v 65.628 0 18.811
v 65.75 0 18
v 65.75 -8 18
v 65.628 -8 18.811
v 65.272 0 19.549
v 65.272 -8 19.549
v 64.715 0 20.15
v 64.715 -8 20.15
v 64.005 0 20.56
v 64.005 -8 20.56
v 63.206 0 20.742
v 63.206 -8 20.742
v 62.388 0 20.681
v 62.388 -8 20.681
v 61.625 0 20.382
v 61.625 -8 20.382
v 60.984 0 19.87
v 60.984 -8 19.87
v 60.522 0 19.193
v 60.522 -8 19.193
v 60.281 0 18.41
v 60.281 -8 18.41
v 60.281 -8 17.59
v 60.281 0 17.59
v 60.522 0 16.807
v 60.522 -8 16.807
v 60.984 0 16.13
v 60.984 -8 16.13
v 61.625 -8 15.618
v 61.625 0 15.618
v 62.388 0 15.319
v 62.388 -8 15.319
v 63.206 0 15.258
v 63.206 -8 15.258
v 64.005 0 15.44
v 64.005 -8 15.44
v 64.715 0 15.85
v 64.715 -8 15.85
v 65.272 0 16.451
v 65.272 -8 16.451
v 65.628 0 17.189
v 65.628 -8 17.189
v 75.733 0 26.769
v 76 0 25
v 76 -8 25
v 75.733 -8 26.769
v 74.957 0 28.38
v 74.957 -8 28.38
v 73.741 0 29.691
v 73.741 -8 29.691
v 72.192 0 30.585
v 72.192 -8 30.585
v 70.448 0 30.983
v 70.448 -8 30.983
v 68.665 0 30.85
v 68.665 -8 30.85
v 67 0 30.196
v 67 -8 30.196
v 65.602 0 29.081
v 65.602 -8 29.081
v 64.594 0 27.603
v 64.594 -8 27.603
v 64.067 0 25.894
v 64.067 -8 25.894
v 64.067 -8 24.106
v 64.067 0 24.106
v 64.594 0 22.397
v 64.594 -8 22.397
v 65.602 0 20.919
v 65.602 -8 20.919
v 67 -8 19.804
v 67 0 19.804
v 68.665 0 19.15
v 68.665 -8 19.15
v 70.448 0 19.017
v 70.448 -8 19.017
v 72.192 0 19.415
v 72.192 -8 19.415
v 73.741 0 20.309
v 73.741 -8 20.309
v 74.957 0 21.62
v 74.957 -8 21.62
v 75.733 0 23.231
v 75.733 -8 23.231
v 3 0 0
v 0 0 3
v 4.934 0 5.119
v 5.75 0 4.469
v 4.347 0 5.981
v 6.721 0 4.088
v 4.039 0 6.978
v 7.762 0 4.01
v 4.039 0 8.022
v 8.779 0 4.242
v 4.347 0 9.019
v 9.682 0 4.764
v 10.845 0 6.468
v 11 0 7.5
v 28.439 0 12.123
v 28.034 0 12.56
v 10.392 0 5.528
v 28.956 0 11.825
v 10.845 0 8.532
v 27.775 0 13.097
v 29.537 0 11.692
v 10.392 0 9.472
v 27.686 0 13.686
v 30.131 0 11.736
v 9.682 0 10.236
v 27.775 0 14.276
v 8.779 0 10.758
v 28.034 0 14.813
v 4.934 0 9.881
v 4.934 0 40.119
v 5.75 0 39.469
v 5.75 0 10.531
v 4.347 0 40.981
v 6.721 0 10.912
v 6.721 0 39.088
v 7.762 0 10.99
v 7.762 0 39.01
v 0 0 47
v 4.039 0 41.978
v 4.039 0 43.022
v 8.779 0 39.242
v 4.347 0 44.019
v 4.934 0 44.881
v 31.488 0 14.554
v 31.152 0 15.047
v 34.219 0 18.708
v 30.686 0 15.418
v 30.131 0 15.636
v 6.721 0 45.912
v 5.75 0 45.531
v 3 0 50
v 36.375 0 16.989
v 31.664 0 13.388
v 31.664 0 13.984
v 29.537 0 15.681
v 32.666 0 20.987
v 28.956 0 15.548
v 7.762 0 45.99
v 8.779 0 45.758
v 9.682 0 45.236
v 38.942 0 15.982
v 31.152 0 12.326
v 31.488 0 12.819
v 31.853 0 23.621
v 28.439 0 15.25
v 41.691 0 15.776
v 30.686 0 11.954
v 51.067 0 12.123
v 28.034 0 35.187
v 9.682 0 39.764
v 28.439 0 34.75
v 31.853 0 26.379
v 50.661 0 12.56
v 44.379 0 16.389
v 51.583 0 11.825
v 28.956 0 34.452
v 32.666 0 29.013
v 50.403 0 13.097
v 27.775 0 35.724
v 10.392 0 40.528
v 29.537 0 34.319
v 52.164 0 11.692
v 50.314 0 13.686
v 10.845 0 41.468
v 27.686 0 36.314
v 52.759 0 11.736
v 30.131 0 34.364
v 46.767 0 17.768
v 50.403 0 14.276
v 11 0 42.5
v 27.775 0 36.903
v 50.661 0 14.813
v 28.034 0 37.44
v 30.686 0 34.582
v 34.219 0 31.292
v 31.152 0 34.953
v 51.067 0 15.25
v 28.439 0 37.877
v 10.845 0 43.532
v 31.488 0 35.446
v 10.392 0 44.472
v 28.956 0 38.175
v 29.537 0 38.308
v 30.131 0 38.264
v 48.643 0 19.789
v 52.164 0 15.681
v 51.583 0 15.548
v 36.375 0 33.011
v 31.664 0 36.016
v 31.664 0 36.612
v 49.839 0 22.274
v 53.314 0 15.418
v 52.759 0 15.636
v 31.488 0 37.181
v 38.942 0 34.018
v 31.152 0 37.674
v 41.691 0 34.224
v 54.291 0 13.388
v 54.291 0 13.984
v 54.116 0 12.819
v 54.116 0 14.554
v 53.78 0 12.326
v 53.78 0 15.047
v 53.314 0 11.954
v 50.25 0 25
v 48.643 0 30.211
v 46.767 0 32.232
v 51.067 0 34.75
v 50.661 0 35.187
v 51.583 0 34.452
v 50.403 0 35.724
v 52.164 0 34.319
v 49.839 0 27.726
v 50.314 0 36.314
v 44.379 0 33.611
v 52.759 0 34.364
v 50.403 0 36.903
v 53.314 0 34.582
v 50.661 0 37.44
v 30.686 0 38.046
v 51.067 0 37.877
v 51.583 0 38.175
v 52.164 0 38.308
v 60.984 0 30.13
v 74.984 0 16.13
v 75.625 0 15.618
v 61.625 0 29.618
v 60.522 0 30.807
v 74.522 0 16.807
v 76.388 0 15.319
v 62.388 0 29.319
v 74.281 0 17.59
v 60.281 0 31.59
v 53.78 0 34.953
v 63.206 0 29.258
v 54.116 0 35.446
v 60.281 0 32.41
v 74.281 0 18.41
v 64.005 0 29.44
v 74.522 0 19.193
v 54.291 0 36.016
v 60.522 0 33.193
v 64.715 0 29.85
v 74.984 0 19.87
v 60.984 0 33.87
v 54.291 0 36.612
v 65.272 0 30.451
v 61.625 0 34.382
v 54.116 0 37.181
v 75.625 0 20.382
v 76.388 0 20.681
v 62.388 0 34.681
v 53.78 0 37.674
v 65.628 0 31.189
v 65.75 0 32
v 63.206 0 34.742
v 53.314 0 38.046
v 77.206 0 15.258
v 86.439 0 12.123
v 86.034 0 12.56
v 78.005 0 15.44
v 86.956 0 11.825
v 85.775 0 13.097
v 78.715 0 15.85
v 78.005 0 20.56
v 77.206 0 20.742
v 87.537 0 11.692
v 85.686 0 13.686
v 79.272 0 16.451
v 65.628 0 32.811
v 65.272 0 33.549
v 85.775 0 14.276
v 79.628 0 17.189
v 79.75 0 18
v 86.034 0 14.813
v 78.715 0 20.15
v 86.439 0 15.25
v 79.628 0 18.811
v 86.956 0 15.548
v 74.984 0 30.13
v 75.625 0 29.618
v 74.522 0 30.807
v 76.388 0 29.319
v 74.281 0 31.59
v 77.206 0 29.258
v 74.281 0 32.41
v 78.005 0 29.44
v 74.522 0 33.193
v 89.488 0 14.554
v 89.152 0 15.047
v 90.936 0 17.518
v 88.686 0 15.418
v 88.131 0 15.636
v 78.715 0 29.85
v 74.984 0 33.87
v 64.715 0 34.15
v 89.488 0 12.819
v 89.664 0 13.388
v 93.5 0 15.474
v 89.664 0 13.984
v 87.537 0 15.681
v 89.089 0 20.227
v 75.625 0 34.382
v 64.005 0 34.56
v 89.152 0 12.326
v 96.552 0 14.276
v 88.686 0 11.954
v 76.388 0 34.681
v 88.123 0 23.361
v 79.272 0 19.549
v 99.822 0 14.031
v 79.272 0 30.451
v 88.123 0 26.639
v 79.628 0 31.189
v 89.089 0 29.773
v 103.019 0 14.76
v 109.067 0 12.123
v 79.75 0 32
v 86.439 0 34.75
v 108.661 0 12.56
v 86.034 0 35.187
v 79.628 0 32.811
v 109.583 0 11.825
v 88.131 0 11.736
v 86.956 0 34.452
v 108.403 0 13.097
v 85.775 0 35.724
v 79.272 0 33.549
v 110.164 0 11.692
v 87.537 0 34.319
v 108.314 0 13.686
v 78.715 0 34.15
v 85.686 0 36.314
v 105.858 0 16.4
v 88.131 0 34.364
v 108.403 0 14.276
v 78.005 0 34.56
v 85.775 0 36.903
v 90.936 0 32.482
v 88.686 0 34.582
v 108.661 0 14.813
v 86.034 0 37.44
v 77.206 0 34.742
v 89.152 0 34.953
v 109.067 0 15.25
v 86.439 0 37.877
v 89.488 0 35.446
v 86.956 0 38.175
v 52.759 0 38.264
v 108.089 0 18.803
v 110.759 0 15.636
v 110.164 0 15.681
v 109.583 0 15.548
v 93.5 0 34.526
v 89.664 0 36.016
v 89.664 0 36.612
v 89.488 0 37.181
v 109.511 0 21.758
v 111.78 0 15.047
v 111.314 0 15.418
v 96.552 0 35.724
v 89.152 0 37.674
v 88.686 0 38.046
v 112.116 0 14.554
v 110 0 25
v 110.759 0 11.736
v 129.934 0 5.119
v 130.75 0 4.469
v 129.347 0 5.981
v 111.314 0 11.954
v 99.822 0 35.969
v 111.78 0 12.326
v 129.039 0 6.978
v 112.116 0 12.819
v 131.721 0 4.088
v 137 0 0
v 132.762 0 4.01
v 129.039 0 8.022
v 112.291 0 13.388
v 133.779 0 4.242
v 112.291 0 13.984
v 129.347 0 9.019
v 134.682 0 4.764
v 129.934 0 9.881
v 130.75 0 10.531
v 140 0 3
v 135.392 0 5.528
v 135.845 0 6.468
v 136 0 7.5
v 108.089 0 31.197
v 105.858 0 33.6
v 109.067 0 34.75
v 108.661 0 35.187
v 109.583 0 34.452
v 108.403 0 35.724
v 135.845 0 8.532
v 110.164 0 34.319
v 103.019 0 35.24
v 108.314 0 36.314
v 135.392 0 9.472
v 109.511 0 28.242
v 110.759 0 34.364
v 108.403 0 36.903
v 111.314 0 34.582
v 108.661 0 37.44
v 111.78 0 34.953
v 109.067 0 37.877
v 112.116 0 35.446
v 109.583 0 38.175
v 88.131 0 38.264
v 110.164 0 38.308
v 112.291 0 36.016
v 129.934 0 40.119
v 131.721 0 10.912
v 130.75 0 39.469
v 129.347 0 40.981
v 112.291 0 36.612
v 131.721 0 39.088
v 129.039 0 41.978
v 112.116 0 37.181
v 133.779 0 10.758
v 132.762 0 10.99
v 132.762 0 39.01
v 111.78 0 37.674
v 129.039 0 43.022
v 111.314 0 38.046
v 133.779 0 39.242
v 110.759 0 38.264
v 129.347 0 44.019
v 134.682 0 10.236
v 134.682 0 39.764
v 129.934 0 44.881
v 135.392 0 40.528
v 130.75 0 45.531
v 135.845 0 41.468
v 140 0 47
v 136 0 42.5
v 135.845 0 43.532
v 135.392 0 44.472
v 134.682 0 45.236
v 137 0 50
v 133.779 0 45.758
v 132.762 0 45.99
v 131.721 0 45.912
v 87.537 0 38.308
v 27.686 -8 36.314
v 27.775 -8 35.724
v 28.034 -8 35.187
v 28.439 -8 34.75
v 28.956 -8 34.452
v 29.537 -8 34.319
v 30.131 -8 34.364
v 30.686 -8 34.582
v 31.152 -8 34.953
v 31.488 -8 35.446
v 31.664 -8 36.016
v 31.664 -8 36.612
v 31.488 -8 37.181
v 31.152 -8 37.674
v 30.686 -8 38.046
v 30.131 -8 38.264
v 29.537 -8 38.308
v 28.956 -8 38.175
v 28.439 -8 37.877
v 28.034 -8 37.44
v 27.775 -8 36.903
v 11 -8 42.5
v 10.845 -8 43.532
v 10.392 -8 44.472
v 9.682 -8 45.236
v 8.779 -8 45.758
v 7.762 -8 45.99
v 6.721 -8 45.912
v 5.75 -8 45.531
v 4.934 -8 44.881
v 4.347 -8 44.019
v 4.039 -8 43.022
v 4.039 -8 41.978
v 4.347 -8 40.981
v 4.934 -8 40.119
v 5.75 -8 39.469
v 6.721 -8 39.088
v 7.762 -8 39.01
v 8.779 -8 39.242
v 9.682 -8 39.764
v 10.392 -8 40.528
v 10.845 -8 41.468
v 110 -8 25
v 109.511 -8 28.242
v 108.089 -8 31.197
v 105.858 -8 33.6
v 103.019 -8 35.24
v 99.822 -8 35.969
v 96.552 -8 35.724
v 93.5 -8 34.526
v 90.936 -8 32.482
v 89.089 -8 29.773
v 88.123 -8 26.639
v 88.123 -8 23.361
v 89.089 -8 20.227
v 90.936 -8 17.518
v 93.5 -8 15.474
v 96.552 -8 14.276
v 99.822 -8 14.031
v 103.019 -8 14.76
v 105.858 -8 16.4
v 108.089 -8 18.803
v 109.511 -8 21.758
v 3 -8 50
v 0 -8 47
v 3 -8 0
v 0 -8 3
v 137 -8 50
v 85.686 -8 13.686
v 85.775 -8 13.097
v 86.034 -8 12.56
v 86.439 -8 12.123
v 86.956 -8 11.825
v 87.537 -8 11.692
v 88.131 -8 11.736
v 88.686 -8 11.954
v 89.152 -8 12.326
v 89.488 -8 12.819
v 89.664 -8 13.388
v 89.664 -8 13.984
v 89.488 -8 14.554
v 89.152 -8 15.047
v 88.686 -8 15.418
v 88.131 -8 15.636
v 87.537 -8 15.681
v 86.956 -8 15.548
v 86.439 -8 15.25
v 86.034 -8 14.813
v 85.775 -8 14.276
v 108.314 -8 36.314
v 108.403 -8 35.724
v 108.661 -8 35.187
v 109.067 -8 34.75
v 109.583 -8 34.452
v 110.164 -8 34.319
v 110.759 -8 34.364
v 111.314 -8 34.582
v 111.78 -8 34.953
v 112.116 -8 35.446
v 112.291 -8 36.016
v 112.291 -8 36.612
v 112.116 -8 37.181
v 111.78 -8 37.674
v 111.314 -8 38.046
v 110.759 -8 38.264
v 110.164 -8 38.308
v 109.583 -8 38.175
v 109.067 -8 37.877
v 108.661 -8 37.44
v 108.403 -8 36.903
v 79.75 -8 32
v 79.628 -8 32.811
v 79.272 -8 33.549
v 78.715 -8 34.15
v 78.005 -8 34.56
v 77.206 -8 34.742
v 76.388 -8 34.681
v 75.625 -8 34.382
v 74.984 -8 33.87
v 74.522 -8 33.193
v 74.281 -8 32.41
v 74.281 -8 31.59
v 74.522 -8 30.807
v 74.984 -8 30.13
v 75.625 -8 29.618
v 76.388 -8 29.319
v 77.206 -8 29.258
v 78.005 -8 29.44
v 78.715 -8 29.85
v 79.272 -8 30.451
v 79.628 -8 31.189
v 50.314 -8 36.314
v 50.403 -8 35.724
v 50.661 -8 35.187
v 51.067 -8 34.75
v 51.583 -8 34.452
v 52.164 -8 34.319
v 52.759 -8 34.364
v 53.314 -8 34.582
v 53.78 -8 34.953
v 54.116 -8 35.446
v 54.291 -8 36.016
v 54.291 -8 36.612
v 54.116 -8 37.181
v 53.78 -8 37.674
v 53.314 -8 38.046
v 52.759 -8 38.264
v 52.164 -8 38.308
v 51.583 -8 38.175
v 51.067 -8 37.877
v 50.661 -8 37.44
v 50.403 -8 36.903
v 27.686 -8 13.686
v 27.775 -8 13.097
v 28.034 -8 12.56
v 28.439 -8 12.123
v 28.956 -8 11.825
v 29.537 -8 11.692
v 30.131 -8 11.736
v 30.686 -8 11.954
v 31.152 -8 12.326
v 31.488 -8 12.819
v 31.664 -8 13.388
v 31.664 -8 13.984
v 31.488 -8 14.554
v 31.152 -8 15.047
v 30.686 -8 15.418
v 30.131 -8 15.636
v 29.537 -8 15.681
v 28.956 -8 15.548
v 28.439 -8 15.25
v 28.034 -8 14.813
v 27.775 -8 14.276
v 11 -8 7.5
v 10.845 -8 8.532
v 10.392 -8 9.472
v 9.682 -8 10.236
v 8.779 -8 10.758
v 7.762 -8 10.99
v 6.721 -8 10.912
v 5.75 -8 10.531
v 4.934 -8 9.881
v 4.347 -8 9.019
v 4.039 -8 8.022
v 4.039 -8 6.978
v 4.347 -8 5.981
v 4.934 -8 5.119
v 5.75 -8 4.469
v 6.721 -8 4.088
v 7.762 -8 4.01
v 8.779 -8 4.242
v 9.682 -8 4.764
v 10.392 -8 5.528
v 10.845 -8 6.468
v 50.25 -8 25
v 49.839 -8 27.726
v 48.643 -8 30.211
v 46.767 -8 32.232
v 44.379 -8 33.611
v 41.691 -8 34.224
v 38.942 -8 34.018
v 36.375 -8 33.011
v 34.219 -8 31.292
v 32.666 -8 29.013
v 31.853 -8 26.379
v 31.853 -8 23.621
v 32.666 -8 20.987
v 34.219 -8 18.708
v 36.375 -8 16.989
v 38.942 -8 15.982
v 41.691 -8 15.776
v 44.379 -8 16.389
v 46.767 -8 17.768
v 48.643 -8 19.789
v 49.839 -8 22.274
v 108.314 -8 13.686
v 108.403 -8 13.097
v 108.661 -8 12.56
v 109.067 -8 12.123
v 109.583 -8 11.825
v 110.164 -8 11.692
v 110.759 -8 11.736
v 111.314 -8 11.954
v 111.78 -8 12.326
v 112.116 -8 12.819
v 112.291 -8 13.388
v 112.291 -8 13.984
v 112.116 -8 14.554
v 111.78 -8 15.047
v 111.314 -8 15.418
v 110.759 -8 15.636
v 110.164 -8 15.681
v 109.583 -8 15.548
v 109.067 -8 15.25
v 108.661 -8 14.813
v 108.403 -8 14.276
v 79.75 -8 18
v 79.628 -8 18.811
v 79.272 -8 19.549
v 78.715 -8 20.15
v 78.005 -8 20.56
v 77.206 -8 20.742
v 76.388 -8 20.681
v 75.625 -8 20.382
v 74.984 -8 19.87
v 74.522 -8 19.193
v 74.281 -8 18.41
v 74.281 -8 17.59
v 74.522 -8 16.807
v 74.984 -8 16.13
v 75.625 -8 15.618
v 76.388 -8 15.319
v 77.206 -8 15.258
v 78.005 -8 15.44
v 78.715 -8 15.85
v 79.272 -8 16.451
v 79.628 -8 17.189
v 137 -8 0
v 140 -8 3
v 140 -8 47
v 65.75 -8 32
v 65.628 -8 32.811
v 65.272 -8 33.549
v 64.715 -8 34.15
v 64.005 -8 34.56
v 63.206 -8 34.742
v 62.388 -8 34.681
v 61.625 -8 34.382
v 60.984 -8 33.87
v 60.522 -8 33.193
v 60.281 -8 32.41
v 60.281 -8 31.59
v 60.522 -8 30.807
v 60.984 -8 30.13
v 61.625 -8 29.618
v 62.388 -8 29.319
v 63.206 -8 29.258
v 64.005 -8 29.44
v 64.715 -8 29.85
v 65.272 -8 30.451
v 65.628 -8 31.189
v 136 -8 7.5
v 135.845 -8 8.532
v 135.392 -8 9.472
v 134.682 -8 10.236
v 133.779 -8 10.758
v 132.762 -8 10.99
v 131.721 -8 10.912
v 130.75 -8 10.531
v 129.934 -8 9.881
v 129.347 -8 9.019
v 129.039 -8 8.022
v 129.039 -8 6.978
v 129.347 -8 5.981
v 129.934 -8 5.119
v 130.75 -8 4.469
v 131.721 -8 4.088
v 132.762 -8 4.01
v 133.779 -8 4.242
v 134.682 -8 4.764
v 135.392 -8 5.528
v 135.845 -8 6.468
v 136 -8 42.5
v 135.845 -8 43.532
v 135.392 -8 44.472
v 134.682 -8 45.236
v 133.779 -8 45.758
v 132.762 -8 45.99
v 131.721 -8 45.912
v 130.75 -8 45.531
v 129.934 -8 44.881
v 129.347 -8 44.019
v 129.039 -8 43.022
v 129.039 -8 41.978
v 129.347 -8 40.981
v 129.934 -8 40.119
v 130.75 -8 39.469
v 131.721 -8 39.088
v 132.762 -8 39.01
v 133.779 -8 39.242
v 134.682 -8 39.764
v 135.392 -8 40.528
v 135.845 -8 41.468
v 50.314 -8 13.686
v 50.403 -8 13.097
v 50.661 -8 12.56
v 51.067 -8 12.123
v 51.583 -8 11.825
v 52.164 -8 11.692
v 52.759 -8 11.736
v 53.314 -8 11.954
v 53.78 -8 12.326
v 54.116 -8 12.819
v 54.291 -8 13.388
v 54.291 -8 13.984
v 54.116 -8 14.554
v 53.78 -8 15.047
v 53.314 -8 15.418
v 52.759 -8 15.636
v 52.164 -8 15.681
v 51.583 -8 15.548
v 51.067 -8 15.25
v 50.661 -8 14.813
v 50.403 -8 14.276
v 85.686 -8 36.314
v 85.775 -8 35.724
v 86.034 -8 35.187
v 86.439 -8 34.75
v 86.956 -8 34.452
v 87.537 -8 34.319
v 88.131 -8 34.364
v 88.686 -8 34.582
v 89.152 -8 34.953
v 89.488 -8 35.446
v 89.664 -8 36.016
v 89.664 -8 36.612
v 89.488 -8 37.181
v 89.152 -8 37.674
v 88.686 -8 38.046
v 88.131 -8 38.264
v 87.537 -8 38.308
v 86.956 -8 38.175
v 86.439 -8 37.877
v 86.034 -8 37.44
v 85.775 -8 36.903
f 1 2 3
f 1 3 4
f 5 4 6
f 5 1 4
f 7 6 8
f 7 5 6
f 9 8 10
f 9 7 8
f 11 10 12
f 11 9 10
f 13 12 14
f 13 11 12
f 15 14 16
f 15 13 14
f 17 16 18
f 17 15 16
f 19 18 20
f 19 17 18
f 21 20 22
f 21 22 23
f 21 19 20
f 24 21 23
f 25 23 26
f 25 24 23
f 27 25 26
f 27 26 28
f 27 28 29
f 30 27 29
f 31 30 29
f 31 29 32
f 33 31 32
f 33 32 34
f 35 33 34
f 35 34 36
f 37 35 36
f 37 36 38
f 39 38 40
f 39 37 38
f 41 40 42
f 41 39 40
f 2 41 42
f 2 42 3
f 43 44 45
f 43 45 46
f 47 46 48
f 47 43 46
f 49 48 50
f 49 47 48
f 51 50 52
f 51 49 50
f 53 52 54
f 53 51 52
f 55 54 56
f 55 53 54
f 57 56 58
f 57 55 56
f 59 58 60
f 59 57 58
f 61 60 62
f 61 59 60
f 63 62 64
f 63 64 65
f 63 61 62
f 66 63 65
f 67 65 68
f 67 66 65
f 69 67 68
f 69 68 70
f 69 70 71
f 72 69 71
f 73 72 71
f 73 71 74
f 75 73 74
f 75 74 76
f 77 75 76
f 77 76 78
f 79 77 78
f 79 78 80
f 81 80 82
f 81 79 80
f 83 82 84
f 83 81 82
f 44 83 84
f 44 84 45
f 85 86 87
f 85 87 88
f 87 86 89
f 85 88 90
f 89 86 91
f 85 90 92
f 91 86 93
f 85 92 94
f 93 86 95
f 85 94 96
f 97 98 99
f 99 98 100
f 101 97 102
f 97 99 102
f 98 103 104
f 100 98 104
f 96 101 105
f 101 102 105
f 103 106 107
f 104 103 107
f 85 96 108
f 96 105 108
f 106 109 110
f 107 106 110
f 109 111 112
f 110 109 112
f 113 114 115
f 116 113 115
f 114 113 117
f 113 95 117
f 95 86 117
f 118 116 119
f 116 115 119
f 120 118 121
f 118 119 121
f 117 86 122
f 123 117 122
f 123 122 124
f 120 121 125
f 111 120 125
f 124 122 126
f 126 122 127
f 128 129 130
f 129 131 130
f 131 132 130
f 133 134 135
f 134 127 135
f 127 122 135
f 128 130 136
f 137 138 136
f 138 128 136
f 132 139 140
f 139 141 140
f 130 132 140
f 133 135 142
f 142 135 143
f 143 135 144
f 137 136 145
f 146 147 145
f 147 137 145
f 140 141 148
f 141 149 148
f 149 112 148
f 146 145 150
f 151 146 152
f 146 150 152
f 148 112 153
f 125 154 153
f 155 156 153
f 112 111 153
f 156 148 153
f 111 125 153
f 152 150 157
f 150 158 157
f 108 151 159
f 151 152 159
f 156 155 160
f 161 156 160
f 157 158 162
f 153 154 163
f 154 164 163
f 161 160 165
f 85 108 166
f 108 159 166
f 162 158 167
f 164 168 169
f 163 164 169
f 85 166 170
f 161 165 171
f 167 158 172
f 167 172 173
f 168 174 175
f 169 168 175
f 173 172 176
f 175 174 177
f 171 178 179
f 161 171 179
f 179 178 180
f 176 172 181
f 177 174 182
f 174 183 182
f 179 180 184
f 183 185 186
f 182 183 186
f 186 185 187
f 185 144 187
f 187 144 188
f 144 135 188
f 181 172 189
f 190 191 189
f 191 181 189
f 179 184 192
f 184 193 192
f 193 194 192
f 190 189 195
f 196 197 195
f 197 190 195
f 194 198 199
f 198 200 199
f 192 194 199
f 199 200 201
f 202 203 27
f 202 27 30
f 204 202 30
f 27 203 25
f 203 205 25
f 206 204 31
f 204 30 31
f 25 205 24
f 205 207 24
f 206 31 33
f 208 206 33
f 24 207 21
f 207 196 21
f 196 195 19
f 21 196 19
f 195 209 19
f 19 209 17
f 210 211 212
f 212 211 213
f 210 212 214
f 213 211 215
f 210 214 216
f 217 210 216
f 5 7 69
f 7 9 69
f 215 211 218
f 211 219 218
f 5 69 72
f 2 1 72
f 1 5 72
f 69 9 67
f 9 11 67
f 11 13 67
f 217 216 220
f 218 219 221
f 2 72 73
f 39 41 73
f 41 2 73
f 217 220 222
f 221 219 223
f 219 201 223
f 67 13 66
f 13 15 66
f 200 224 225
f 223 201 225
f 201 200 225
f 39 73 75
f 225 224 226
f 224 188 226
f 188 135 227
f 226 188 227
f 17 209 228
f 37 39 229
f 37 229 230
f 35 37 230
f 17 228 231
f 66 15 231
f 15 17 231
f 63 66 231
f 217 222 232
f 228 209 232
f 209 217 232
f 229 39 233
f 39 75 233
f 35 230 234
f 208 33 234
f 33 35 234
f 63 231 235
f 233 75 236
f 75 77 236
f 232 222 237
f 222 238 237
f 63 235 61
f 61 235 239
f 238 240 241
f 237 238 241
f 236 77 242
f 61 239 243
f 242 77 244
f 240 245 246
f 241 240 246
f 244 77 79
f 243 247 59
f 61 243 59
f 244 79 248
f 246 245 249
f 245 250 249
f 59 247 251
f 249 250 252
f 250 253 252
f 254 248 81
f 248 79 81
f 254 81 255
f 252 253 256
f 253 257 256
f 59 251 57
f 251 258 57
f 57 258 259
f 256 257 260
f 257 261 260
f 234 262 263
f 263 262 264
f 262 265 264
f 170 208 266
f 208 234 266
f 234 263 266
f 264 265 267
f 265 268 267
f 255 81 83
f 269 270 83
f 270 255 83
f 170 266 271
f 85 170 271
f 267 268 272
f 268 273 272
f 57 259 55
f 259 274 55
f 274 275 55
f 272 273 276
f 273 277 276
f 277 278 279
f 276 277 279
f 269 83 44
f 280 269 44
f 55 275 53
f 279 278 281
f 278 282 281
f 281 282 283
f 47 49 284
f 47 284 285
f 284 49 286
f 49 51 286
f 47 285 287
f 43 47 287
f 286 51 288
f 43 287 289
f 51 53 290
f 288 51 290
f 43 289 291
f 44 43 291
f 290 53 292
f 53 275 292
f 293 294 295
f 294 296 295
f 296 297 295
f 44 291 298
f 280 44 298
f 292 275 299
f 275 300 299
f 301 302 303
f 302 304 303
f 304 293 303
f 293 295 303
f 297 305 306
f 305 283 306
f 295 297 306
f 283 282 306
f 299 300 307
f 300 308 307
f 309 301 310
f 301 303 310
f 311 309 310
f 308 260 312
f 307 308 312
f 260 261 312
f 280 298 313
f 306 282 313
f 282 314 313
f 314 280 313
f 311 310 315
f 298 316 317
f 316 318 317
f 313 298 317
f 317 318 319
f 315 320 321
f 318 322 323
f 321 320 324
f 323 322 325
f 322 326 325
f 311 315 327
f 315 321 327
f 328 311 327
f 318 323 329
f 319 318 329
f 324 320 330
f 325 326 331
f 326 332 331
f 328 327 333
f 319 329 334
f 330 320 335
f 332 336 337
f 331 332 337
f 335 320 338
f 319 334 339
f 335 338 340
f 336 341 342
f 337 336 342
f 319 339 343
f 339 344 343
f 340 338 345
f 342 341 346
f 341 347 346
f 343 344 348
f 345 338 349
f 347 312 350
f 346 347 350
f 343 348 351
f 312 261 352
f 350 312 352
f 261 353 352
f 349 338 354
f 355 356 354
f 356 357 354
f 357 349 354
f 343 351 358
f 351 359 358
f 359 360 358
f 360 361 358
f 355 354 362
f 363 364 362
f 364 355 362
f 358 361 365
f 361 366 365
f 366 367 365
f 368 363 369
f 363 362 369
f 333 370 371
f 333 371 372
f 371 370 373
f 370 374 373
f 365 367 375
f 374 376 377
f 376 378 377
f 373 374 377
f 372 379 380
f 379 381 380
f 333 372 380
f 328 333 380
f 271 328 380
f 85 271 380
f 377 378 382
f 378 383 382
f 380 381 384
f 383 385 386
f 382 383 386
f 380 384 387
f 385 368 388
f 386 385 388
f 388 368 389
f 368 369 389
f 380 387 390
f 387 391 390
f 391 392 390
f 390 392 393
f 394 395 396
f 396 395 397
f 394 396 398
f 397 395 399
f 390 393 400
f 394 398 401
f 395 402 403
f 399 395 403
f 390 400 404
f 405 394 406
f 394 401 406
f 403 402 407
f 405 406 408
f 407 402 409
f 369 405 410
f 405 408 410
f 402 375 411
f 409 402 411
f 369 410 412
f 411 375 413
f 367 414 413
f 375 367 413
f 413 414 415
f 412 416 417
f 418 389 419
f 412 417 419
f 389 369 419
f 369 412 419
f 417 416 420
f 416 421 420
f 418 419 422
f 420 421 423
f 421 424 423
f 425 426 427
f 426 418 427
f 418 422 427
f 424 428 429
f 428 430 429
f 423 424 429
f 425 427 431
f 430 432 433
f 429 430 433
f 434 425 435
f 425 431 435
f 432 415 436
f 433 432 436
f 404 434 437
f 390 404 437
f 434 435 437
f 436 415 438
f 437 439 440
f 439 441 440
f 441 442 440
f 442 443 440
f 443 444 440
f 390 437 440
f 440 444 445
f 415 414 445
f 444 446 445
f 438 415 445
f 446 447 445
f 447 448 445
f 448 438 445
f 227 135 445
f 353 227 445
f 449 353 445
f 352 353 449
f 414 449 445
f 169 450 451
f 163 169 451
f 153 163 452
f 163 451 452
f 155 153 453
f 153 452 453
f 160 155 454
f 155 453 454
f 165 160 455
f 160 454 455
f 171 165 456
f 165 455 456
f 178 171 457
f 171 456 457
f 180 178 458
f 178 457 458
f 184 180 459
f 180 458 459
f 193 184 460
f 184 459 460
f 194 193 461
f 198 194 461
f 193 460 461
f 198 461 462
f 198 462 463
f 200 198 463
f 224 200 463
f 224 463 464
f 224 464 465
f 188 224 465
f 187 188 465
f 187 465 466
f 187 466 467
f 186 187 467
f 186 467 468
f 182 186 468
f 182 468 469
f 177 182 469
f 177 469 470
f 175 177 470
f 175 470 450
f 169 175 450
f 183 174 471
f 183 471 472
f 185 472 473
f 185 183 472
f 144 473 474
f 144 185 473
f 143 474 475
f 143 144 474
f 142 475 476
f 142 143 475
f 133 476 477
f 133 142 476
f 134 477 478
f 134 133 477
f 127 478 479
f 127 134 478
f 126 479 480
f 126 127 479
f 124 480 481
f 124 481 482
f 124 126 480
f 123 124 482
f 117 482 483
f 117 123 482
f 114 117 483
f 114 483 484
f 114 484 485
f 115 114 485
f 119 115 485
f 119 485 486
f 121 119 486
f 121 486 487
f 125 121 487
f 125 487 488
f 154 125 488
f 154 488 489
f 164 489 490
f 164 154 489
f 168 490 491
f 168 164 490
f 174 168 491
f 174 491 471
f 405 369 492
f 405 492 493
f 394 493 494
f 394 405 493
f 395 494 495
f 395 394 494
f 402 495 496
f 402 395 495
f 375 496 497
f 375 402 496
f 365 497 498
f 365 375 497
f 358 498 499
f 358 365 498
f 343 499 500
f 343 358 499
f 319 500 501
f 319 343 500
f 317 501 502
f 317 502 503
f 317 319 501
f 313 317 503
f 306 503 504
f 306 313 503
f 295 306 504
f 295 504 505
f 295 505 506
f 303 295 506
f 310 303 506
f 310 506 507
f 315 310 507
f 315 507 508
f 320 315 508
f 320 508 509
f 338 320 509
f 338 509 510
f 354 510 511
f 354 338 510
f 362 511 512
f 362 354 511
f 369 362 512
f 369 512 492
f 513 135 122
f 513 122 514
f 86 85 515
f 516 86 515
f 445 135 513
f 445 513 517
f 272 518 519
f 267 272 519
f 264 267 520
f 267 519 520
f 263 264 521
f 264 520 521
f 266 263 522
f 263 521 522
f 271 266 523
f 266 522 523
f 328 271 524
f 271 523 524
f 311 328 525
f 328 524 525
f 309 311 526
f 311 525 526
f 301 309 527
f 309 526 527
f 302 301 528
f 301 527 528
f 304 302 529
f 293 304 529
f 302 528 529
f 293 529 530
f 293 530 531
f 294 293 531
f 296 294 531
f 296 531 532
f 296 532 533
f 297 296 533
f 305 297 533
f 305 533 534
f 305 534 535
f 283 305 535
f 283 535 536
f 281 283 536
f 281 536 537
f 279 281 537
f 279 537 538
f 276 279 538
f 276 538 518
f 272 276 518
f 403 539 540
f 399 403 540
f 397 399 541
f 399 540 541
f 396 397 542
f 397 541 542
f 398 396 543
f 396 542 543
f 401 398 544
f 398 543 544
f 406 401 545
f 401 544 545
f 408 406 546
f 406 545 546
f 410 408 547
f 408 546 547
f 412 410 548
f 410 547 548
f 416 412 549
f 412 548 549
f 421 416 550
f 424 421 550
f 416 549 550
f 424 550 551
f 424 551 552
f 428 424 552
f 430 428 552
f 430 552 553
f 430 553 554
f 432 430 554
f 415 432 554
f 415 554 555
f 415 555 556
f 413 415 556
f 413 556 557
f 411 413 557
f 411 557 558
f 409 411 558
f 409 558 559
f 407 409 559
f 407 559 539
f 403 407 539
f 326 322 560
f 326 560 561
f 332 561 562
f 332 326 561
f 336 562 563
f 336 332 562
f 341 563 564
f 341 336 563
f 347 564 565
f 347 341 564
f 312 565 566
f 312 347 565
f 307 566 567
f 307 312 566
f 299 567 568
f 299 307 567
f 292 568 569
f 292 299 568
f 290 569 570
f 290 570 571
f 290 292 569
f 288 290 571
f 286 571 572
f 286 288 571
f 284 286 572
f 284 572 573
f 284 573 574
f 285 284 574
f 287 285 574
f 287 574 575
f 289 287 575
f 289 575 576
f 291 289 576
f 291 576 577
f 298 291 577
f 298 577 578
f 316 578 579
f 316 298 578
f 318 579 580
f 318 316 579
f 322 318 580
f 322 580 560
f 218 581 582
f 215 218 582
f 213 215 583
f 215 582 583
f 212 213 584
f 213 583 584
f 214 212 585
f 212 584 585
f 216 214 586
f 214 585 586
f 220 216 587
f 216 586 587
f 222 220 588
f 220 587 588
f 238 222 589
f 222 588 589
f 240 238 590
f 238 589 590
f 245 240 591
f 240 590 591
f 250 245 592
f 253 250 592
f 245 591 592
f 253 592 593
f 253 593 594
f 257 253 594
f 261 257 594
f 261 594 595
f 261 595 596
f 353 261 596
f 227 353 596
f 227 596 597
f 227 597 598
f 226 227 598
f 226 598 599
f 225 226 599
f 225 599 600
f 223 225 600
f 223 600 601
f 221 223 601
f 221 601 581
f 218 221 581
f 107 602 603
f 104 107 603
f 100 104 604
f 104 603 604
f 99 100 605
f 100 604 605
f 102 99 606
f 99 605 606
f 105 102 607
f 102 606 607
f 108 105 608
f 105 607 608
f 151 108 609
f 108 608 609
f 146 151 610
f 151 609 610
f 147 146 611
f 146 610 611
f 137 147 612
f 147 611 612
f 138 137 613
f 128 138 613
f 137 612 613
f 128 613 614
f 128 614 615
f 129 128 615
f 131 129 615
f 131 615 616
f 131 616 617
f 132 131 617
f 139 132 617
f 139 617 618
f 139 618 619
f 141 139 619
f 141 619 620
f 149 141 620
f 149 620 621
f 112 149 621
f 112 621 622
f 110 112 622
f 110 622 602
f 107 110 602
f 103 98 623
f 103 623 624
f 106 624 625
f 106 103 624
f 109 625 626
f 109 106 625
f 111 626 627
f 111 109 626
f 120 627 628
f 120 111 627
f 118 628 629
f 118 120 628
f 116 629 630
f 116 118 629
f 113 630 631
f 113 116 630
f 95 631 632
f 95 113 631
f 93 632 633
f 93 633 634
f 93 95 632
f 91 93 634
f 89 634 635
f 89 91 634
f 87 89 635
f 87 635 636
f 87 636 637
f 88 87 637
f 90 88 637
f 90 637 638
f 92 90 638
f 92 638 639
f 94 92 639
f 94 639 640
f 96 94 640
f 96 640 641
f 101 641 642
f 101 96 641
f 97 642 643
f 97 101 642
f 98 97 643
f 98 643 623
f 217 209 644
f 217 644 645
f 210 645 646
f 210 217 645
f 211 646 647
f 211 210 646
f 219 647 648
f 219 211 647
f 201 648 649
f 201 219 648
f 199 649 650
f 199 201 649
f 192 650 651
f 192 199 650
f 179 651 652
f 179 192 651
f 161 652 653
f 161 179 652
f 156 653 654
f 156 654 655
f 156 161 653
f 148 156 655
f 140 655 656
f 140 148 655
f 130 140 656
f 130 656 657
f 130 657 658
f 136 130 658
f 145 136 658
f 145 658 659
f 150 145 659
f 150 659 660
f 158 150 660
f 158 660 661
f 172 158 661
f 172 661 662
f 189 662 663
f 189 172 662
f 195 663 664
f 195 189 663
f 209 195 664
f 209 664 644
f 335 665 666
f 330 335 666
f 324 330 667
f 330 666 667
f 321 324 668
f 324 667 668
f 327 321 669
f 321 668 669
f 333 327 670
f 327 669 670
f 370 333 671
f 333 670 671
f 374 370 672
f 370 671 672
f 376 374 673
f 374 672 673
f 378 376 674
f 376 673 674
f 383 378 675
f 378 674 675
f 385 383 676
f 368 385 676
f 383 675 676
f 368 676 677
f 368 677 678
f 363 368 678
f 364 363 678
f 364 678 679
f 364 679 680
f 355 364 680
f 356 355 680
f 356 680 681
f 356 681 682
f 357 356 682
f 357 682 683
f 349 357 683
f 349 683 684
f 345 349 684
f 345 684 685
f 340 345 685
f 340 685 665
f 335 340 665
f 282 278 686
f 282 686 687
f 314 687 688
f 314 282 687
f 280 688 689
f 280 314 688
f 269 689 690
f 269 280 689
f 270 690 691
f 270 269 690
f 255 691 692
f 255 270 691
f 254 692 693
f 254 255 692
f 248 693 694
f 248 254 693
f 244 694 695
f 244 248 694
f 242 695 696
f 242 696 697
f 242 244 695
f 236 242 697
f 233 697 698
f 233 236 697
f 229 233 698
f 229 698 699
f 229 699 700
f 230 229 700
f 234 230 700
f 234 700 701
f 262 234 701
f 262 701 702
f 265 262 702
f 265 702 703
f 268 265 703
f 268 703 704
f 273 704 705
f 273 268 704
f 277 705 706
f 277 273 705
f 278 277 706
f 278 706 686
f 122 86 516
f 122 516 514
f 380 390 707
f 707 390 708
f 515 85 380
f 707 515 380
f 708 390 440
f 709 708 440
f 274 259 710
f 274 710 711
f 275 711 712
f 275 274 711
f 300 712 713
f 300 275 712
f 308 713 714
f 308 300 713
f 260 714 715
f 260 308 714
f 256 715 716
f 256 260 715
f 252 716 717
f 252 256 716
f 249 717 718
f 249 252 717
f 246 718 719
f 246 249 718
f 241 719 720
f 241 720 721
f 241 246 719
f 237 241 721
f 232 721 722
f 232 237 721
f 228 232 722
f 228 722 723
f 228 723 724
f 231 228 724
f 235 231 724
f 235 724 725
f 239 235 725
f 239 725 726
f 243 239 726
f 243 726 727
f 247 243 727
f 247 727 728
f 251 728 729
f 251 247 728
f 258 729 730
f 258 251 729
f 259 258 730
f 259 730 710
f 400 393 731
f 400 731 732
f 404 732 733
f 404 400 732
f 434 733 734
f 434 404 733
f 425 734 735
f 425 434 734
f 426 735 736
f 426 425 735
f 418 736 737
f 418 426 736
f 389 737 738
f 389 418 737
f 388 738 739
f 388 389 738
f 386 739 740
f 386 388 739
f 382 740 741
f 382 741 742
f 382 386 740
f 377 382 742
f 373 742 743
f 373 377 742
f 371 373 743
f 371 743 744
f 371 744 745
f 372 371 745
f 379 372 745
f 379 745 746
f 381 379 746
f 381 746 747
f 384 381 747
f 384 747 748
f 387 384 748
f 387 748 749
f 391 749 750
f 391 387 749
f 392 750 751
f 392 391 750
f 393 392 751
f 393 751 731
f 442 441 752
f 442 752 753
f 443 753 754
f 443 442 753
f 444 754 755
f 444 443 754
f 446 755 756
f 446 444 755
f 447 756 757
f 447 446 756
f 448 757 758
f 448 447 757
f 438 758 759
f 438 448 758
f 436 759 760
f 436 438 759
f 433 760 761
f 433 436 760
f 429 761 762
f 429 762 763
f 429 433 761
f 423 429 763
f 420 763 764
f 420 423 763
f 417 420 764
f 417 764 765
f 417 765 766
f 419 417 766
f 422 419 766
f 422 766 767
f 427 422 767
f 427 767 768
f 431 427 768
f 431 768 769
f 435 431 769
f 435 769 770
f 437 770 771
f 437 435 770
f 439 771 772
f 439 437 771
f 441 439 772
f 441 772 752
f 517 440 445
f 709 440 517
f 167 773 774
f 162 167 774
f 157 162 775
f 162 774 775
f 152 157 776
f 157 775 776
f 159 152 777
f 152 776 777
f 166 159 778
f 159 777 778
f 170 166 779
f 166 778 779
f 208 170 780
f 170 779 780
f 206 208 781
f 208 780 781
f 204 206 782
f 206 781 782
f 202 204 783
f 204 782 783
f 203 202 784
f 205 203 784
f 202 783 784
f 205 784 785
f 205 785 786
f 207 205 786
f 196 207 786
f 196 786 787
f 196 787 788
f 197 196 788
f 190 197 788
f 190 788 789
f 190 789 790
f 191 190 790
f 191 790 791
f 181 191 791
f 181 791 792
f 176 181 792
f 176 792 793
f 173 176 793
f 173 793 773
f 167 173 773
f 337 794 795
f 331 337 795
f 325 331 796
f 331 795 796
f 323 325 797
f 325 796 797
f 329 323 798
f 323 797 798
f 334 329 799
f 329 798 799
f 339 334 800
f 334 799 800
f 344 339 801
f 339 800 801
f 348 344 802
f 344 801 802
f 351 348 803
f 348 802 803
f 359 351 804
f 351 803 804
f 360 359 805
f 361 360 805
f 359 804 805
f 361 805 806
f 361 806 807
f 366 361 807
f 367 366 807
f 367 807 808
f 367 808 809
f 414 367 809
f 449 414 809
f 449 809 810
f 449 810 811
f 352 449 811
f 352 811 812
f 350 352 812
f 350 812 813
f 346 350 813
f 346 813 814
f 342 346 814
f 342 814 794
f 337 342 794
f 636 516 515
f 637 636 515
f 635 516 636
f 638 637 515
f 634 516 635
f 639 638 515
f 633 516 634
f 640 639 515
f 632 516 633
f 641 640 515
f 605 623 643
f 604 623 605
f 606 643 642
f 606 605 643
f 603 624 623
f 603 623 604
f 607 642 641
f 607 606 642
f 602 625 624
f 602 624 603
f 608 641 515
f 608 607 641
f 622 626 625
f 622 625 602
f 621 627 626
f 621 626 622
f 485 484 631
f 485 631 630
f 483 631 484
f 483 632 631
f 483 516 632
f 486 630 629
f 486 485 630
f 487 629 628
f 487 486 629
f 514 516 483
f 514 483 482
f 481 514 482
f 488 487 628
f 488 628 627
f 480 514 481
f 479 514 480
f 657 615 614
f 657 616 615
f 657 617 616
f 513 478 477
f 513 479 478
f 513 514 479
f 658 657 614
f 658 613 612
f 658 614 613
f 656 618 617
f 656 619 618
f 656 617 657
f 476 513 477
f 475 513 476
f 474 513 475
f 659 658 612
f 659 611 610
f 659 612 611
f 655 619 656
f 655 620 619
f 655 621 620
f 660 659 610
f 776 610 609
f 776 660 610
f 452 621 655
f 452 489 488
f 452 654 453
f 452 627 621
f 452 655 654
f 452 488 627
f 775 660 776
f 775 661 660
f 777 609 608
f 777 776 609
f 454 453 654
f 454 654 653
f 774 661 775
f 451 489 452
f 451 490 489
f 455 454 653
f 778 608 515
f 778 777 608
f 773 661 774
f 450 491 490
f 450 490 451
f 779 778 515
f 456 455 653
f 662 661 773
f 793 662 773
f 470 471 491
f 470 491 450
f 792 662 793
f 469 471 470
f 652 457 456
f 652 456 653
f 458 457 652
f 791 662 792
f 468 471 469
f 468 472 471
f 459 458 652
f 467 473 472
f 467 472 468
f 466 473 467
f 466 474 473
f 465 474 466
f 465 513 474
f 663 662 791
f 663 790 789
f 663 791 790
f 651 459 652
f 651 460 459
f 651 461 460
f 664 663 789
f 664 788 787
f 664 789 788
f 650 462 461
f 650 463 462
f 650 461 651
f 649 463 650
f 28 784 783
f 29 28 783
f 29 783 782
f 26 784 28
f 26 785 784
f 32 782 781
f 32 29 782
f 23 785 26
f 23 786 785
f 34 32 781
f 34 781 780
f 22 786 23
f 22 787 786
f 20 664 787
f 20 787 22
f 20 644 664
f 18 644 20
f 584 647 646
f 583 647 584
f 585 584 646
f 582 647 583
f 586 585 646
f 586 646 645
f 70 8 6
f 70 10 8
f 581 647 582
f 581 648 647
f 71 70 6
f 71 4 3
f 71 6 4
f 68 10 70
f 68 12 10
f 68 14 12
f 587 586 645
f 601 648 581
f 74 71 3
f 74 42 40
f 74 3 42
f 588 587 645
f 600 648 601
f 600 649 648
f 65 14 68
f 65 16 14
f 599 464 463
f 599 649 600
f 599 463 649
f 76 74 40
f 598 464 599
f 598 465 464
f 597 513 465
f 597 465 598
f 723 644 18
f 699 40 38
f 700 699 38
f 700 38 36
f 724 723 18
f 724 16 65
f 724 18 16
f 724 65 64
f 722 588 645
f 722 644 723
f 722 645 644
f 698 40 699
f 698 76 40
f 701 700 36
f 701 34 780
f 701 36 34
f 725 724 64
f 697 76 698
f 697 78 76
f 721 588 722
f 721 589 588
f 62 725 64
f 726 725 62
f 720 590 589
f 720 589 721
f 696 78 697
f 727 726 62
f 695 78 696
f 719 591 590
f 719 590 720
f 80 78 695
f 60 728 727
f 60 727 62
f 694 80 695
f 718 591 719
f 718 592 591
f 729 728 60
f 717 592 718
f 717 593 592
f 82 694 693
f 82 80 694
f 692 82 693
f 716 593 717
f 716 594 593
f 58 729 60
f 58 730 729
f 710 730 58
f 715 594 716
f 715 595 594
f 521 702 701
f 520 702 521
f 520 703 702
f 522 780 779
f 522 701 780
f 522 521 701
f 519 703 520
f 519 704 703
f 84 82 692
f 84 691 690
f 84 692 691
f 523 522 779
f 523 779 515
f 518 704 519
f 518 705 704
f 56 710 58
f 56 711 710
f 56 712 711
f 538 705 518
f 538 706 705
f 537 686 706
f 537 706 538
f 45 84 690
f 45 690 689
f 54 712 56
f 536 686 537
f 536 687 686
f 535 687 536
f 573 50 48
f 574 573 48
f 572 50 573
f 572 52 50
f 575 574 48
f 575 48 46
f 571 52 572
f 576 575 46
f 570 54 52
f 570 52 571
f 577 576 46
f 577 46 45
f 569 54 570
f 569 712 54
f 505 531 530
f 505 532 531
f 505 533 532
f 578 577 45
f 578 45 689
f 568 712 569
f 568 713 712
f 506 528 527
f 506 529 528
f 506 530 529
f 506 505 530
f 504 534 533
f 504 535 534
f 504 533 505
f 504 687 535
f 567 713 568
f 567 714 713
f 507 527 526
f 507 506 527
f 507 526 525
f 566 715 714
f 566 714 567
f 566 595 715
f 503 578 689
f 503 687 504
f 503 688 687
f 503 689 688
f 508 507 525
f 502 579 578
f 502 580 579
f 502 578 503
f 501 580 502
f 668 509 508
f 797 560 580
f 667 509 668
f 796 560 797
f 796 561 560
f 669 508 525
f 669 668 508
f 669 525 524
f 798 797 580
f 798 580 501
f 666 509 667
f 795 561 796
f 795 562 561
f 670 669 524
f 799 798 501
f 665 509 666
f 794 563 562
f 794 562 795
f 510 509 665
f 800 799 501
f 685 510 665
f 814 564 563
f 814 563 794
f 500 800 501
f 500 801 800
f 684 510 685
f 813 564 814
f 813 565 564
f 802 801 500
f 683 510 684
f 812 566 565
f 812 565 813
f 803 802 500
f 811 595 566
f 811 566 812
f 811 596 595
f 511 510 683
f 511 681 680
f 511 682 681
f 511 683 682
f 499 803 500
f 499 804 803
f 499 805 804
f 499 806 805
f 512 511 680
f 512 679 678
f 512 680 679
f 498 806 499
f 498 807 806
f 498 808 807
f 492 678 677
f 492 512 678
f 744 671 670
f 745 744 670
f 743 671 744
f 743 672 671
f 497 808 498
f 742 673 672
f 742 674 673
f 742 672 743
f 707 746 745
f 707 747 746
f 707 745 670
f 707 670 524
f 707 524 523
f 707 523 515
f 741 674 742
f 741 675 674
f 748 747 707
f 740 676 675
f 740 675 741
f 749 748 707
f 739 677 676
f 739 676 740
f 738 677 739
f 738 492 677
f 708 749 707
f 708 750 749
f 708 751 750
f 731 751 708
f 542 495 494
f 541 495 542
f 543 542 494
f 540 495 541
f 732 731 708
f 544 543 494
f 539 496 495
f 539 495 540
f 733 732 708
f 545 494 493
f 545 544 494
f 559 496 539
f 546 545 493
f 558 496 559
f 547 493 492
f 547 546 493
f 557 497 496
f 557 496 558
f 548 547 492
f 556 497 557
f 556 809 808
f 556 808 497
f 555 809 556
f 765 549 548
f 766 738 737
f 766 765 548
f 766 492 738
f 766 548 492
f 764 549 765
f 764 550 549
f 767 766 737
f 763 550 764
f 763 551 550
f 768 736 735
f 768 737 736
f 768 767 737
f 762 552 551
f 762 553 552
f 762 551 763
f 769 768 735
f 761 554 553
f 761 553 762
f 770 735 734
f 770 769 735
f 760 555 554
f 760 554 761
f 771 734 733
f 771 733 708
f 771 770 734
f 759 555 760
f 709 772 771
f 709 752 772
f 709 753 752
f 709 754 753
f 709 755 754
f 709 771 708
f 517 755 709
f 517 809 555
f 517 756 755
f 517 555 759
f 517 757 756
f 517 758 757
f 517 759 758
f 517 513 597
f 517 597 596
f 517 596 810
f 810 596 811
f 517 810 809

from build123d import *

# Parameters (mm, degrees)
F0_W     = 140
F0_H     = 50
F0_R     = 3.5
F0_R_2   = 2
F0_R_3   = 2.75
F0_R_4   = 9.25
F0_R_5   = 6
F0_R_6   = 11
F1_DEPTH = 8
F2_D     = 4
F3_SIZE  = 3


with BuildPart() as f1:
    # F0 (on Front) → F1 (new body)
    with BuildSketch(Plane.XZ):
        with Locations((70, 25)):
            Rectangle(F0_W, F0_H)
        with Locations((7.5, 7.5)):
            Circle(F0_R, mode=Mode.SUBTRACT)
        with Locations((29.686291501, 13.686291501)):
            Circle(F0_R_2, mode=Mode.SUBTRACT)
        with Locations((52.313708499, 13.686291501)):
            Circle(F0_R_2, mode=Mode.SUBTRACT)
        with Locations((63, 18)):
            Circle(F0_R_3, mode=Mode.SUBTRACT)
        with Locations((132.5, 7.5)):
            Circle(F0_R, mode=Mode.SUBTRACT)
        with Locations((77, 18)):
            Circle(F0_R_3, mode=Mode.SUBTRACT)
        with Locations((87.686291501, 13.686291501)):
            Circle(F0_R_2, mode=Mode.SUBTRACT)
        with Locations((110.313708499, 13.686291501)):
            Circle(F0_R_2, mode=Mode.SUBTRACT)
        with Locations((29.686291501, 36.313708499)):
            Circle(F0_R_2, mode=Mode.SUBTRACT)
        with Locations((41, 25)):
            Circle(F0_R_4, mode=Mode.SUBTRACT)
        with Locations((52.313708499, 36.313708499)):
            Circle(F0_R_2, mode=Mode.SUBTRACT)
        with Locations((63, 32)):
            Circle(F0_R_3, mode=Mode.SUBTRACT)
        with Locations((7.5, 42.5)):
            Circle(F0_R, mode=Mode.SUBTRACT)
        with Locations((70, 25)):
            Circle(F0_R_5, mode=Mode.SUBTRACT)
        with Locations((99, 25)):
            Circle(F0_R_6, mode=Mode.SUBTRACT)
        with Locations((77, 32)):
            Circle(F0_R_3, mode=Mode.SUBTRACT)
        with Locations((87.686291501, 36.313708499)):
            Circle(F0_R_2, mode=Mode.SUBTRACT)
        with Locations((110.313708499, 36.313708499)):
            Circle(F0_R_2, mode=Mode.SUBTRACT)
        with Locations((132.5, 42.5)):
            Circle(F0_R, mode=Mode.SUBTRACT)
        with Locations((52.313708499, 36.313708499)):
            Circle(F0_R_2)
        with Locations((29.686291501, 36.313708499)):
            Circle(F0_R_2)
        with Locations((29.686291501, 13.686291501)):
            Circle(F0_R_2)
        with Locations((52.313708499, 13.686291501)):
            Circle(F0_R_2)
        with Locations((87.686291501, 13.686291501)):
            Circle(F0_R_2)
        with Locations((110.313708499, 13.686291501)):
            Circle(F0_R_2)
        with Locations((110.313708499, 36.313708499)):
            Circle(F0_R_2)
        with Locations((87.686291501, 36.313708499)):
            Circle(F0_R_2)
    extrude(amount=F1_DEPTH)

    # F2 (through all)
    with Locations(Plane(origin=(0, 0, 0), x_dir=(1, 0, 0), z_dir=(0, 1, 0))):
        with Locations((29.686291501, -36.313708499), (29.686291501, -13.686291501), (52.313708499, -13.686291501), (52.313708499, -36.313708499), (87.686291501, -36.313708499), (87.686291501, -13.686291501), (110.313708499, -13.686291501), (110.313708499, -36.313708499)):
            Hole(F2_D / 2)

    # F3
    f3_edges = [f1.edges().sort_by_distance(p)[0] for p in [
        (140, -4, 50),
        (140, -4, 0),
        (0, -4, 0),
        (0, -4, 50),
    ]]
    chamfer(f3_edges, length=F3_SIZE)


solid = f1.part
